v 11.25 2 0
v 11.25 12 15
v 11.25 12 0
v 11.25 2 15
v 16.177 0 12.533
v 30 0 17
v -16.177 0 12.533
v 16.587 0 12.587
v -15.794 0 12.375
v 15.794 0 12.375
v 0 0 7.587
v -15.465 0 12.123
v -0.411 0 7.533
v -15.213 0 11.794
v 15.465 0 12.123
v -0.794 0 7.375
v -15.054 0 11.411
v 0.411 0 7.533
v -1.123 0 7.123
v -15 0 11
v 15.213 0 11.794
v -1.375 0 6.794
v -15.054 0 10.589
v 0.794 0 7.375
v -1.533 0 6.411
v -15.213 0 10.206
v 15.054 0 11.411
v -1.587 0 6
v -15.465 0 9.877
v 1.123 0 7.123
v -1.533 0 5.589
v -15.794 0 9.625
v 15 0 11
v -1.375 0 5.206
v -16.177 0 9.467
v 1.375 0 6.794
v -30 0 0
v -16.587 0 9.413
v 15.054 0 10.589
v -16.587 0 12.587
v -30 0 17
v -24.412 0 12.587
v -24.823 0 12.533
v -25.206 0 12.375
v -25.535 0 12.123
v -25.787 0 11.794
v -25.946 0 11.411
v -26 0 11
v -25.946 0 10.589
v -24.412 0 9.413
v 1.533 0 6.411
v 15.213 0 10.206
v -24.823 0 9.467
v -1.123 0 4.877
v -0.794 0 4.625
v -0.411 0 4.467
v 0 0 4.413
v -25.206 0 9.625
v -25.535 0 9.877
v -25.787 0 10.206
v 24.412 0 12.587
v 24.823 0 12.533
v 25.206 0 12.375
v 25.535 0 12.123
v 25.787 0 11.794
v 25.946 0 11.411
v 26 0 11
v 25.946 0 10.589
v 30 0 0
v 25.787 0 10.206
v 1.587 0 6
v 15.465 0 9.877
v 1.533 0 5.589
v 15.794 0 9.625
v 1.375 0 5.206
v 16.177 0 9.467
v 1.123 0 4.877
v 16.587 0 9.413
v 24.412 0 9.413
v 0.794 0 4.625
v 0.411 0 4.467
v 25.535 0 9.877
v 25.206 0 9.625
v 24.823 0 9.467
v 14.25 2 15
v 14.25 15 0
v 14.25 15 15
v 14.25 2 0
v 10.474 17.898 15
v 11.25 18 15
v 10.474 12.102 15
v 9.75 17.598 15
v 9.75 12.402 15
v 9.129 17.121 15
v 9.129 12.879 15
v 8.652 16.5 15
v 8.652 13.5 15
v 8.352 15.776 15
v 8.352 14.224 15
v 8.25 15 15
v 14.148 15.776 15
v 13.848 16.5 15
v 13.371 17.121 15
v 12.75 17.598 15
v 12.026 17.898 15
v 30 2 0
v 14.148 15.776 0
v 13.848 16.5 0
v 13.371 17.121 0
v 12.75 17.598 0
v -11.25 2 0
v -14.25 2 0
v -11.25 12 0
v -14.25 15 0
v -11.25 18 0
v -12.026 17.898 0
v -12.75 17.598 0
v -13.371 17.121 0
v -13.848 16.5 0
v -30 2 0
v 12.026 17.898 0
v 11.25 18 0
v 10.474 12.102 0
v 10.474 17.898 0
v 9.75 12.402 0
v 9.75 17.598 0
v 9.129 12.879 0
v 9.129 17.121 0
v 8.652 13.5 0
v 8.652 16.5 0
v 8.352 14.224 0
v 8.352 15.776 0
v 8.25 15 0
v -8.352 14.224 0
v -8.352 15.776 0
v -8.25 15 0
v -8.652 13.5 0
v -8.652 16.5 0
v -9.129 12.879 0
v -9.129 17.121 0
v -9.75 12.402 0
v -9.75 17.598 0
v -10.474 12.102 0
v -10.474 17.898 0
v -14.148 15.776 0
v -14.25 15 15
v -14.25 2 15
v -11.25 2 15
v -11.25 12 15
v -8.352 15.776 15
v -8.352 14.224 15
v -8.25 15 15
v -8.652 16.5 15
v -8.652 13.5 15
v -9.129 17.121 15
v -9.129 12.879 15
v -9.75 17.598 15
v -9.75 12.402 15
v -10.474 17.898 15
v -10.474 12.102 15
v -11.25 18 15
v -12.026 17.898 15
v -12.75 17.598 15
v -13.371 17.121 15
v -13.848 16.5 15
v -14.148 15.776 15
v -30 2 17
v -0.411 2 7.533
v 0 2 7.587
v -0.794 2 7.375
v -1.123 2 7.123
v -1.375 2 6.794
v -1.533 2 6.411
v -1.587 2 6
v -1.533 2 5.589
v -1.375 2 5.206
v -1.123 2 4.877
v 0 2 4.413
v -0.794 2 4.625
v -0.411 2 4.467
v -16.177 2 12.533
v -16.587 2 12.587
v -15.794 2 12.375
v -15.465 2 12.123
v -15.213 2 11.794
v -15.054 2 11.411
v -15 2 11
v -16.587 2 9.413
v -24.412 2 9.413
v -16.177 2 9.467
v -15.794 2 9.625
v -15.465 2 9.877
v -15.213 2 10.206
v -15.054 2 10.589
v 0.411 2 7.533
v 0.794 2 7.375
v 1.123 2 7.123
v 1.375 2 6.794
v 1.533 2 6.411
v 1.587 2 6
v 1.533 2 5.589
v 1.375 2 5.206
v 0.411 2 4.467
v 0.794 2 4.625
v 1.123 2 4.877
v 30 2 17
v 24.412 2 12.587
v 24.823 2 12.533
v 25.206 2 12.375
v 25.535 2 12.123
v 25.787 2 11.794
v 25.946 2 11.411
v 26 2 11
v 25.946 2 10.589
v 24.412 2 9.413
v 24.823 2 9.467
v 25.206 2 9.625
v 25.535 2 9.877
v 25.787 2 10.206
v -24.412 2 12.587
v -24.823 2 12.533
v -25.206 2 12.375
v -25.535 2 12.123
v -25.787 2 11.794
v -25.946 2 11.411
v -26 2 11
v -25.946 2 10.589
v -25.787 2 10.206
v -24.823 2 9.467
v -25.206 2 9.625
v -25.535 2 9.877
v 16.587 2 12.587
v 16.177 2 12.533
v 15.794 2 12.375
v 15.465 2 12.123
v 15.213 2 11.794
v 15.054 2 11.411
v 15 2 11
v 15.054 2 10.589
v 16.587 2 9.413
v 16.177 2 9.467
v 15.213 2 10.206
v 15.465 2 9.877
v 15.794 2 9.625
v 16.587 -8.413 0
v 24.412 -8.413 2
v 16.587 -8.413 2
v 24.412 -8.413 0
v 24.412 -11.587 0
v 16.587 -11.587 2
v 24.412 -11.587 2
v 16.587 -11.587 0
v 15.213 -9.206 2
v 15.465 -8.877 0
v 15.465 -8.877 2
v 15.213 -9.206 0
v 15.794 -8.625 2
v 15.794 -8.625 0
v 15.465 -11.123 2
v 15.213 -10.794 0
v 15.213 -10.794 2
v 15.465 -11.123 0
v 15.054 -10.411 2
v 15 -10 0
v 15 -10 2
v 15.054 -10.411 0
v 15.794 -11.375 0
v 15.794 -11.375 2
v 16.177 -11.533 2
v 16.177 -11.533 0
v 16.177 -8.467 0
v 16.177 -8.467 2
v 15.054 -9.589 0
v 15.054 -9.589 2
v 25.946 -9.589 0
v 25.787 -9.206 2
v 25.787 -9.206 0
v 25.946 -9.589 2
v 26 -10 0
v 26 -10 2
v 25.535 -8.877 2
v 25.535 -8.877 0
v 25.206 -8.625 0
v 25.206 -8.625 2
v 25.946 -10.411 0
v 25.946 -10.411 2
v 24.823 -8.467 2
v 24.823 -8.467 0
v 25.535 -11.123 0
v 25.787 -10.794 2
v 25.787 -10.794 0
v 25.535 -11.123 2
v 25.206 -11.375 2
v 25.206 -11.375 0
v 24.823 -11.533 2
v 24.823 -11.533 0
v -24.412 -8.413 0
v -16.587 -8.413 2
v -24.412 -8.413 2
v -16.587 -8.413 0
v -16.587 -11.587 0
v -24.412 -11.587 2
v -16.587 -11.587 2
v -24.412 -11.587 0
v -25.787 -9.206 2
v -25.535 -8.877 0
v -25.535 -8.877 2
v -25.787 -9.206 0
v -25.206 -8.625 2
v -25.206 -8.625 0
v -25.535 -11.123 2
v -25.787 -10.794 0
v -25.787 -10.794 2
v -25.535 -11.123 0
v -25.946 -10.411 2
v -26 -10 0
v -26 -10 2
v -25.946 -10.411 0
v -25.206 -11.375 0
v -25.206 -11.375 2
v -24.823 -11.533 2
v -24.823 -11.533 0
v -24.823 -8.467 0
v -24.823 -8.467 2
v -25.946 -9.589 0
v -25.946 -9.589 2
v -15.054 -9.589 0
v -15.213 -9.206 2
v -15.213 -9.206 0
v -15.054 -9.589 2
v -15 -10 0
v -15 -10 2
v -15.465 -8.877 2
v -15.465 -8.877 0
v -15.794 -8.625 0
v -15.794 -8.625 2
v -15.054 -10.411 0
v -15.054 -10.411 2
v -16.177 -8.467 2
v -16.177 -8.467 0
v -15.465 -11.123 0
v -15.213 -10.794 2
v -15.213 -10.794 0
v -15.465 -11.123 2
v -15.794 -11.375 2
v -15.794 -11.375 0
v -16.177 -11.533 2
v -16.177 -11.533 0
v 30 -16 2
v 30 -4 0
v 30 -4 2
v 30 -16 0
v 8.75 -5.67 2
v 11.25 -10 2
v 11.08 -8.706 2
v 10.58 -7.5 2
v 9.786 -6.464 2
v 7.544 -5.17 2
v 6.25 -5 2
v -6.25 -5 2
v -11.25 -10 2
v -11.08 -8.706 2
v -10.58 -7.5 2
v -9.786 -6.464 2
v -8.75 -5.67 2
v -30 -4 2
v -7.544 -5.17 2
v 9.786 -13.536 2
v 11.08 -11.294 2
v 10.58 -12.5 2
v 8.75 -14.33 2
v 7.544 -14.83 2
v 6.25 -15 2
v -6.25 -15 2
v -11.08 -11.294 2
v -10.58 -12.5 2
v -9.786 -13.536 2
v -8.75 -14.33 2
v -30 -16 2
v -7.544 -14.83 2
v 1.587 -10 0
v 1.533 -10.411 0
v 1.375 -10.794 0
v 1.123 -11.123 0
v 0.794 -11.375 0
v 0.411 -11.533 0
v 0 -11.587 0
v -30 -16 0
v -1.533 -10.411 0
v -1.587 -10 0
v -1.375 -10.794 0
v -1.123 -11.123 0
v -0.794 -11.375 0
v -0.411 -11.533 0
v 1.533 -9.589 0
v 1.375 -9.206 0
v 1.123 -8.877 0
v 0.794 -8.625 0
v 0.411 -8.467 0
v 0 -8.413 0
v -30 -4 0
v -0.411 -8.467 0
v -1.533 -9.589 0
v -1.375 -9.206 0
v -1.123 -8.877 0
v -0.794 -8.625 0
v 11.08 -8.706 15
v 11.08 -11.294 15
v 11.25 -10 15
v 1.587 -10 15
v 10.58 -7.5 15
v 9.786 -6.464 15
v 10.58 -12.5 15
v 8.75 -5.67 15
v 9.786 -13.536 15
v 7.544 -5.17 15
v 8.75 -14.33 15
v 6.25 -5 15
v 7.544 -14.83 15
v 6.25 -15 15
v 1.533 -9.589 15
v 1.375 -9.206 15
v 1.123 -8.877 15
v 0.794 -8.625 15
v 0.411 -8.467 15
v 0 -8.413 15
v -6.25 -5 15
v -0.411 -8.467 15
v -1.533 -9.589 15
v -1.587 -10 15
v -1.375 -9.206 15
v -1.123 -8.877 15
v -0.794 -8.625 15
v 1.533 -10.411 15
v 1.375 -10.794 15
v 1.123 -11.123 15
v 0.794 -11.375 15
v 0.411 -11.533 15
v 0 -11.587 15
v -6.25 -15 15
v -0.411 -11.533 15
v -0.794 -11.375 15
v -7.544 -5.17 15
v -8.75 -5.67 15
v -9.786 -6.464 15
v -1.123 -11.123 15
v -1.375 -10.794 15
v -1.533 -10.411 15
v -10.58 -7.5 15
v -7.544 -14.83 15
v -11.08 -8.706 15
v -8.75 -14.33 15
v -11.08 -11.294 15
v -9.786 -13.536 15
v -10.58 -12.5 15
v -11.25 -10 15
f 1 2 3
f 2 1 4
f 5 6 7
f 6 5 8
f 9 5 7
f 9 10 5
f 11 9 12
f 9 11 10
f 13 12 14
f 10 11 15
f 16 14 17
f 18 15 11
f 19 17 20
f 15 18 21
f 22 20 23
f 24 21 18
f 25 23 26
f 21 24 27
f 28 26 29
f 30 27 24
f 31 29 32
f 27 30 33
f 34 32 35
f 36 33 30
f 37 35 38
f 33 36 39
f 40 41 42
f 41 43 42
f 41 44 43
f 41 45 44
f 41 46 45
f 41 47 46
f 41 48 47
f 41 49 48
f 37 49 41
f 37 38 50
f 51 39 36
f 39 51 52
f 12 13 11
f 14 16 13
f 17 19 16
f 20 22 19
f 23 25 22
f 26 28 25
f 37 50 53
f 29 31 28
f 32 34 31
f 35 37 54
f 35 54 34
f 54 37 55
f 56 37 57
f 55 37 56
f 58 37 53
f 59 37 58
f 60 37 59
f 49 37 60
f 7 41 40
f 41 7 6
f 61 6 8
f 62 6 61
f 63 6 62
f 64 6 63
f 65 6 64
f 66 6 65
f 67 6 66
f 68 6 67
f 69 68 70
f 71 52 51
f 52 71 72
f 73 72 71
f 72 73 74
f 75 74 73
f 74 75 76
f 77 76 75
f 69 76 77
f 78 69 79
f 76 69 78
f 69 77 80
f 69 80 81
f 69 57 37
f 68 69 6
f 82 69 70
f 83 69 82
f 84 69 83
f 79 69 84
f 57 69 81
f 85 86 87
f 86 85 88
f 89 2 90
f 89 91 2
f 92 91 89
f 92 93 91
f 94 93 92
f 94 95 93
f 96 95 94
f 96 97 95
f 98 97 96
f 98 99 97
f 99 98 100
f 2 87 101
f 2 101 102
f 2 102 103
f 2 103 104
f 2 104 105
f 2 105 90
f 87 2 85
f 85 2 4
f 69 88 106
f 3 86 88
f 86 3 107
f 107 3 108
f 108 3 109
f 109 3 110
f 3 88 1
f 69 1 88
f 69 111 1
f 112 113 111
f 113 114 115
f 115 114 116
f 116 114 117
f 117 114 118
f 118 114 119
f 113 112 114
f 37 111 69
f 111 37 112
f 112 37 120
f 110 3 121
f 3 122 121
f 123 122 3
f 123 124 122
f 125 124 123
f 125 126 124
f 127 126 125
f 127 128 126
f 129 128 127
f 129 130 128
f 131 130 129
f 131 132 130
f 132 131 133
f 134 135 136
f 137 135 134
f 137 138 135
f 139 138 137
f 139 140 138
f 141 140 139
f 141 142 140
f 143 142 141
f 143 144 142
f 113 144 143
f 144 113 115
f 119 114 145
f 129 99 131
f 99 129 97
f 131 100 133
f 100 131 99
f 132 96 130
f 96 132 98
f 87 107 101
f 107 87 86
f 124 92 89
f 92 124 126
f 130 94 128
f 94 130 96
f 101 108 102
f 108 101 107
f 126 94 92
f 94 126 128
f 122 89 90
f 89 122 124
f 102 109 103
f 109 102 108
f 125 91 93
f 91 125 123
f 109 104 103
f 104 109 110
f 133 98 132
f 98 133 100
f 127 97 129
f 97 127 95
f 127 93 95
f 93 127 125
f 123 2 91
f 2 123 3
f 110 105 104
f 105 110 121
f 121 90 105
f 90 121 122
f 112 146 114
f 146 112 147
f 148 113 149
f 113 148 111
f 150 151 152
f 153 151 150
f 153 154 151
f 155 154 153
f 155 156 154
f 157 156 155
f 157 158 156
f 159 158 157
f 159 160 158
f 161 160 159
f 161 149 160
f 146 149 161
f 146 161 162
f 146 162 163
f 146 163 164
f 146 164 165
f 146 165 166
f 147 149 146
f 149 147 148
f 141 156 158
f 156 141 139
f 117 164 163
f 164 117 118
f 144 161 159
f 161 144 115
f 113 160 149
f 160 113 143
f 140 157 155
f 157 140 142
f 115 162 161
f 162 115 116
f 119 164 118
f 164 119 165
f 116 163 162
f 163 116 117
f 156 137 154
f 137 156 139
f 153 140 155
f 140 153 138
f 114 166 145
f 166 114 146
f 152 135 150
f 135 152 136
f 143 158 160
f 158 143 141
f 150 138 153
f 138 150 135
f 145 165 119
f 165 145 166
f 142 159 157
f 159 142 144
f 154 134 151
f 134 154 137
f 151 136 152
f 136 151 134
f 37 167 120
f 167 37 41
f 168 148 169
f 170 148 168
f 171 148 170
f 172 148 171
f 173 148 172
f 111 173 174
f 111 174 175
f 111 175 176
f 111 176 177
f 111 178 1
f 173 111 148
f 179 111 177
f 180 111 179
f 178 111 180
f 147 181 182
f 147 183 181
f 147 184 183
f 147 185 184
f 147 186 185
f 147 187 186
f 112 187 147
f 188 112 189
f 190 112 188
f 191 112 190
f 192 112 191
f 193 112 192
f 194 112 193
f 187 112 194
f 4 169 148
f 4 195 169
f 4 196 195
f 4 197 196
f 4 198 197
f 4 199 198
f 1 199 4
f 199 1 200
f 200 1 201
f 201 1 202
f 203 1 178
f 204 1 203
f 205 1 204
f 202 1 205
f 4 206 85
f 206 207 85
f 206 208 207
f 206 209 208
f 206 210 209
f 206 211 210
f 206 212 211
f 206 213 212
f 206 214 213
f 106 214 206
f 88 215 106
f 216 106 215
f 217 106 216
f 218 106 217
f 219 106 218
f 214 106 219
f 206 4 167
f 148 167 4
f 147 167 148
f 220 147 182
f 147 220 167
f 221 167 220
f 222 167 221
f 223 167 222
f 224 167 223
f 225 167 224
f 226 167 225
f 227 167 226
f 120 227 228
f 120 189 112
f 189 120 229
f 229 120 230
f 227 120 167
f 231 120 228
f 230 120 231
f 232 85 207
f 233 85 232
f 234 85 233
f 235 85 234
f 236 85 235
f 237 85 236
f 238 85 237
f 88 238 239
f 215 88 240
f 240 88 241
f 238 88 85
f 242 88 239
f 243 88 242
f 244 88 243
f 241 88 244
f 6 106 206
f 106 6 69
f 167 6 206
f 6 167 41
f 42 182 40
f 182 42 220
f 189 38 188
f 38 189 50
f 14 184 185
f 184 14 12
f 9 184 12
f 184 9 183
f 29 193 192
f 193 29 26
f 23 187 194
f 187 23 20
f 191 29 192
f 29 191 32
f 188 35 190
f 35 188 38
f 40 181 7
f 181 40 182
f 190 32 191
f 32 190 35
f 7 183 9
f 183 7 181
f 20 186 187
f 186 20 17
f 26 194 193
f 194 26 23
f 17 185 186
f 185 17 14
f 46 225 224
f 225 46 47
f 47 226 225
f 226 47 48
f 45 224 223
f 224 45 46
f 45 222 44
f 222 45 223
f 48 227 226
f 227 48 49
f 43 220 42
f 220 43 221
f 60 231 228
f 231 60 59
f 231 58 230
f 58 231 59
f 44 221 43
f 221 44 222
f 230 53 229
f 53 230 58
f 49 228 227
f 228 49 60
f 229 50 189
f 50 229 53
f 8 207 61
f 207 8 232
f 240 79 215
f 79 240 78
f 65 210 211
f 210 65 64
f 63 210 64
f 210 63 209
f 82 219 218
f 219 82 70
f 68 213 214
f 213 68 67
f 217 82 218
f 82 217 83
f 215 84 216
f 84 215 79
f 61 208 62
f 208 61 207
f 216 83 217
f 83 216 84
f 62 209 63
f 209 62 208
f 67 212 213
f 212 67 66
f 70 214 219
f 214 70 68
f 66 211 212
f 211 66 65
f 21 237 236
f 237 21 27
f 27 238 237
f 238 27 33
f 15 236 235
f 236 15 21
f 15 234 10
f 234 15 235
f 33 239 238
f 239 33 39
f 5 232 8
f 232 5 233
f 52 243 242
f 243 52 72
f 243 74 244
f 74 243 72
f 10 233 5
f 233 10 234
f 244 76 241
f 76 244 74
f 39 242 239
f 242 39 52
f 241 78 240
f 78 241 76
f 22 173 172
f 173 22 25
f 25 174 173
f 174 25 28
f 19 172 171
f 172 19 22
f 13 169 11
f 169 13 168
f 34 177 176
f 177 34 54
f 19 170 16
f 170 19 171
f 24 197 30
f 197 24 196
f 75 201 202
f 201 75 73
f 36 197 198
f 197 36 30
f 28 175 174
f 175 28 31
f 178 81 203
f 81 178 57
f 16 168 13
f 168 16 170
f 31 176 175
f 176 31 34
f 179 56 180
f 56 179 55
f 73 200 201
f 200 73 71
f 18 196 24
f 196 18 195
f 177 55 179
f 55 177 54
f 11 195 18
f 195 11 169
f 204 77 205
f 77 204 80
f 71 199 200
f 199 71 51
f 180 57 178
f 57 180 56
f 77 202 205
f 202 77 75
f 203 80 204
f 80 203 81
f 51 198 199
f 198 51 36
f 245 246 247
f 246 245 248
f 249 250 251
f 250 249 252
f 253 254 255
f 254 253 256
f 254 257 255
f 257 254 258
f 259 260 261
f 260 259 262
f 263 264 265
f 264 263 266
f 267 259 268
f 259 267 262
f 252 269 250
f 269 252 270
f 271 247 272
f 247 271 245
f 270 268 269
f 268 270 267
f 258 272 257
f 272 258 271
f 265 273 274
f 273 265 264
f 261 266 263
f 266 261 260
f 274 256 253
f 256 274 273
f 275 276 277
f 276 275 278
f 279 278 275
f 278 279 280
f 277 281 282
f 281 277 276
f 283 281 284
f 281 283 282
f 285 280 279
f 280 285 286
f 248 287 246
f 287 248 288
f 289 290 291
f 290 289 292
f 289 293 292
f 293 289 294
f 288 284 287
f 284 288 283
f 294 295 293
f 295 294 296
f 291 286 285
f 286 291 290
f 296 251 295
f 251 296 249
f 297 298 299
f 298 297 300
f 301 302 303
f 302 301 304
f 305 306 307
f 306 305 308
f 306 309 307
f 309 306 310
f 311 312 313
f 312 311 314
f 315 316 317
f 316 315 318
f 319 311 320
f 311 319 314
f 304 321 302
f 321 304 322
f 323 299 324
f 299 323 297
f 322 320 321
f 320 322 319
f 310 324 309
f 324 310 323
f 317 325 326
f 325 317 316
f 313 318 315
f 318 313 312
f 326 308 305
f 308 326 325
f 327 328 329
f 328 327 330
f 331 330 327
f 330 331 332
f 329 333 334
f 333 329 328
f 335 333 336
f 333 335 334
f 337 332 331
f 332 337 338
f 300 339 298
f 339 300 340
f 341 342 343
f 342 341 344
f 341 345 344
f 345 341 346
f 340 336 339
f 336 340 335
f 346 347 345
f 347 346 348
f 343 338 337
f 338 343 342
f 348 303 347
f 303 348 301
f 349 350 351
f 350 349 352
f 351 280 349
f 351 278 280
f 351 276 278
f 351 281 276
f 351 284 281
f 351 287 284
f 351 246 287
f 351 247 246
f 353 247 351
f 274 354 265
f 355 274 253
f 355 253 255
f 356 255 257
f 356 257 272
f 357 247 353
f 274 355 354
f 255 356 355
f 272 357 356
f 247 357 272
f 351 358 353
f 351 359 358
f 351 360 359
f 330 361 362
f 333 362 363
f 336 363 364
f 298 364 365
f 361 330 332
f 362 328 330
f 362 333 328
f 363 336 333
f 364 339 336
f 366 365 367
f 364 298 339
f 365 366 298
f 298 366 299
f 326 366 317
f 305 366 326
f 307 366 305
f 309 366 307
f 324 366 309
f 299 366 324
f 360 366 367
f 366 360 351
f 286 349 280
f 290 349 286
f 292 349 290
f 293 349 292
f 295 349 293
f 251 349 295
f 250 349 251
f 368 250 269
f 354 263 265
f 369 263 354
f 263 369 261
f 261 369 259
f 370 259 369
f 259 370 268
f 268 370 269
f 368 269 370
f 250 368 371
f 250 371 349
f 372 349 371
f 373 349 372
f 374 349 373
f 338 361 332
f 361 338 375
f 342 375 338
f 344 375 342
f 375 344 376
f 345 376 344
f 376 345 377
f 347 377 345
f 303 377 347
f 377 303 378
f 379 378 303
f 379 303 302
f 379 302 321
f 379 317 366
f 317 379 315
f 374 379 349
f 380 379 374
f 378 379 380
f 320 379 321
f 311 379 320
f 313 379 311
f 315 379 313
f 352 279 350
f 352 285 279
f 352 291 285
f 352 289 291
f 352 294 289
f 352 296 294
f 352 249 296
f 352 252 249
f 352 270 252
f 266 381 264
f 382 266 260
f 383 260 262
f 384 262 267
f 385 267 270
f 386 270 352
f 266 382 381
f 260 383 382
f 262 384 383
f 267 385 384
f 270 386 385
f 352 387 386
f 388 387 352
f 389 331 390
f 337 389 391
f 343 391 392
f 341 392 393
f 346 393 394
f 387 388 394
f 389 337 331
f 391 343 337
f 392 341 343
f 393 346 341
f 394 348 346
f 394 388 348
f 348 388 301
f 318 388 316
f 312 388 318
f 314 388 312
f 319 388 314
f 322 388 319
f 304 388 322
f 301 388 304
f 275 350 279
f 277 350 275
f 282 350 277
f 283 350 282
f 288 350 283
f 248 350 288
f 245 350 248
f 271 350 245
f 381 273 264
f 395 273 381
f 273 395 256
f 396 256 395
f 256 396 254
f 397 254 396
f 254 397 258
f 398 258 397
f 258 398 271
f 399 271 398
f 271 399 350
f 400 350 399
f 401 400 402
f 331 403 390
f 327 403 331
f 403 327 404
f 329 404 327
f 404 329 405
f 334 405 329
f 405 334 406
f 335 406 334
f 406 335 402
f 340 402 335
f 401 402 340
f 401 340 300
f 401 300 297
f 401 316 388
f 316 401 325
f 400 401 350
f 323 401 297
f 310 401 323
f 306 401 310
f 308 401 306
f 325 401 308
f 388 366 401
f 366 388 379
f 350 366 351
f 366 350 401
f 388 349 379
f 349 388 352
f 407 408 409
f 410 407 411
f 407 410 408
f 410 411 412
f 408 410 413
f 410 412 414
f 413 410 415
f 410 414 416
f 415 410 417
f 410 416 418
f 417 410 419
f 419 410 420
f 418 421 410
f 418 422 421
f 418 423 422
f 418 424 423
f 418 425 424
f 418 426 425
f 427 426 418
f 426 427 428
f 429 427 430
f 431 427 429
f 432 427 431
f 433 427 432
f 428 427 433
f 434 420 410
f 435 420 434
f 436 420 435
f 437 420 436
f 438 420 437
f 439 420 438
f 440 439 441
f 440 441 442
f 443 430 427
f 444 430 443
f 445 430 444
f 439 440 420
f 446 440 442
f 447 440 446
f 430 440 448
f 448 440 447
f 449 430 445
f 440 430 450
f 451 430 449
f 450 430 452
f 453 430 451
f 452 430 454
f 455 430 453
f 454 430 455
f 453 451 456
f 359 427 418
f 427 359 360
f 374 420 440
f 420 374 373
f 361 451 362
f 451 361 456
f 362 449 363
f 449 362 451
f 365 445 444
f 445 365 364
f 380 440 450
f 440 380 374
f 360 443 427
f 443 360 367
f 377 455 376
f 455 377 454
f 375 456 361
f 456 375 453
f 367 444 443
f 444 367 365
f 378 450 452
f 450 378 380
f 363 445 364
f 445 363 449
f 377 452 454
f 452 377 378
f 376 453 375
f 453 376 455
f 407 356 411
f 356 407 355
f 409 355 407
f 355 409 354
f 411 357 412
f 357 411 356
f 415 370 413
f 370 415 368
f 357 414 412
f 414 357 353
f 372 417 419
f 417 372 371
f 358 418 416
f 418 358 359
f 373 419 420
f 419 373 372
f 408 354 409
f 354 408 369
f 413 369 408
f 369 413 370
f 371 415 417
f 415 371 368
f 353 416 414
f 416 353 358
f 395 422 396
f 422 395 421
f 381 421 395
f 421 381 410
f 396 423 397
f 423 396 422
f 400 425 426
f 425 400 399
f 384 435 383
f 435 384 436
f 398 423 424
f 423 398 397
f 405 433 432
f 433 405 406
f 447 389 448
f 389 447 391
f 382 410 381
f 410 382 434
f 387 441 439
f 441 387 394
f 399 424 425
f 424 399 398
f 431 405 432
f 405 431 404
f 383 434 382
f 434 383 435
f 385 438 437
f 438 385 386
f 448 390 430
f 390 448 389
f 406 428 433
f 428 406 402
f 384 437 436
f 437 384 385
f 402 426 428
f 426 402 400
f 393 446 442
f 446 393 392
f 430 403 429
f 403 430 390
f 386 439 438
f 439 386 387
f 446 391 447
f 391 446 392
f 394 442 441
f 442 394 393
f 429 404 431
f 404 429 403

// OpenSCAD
// Faceplate Clip - Socket and Peg

$fs=0.1;
$fa=15;

// render_part=1; // Faceplate_Clip_Peg()
render_part=2; // Faceplate_Clip_Socket()
render_part=3; // Faceplate_Clip_Peg and Faceplate_Clip_Socket

module Faceplate_Clip_Peg_Body(extension=0.1
	, base_width=12.0
	, base_length=60.0
	, base_height=2.0
	, peg_outer_length=22.5
	, peg_width=10.0
	, peg_height=13.0
  ) {
  union() {
    translate([-base_length/2,-base_width/2,0]) cube(size=[base_length,base_width,base_height],center=false);
    translate([-peg_outer_length/2+peg_width/2,-peg_width/2,0])
	cube(size=[peg_outer_length-peg_width,peg_width,peg_height+base_height],center=false);
    translate([-peg_outer_length/2+peg_width/2,0,0])
	cylinder(r=peg_width/2,h=peg_height+base_height,center=false);
    translate([peg_outer_length/2-peg_width/2,0,0])
	cylinder(r=peg_width/2,h=peg_height+base_height,center=false);
  }
}

module Faceplate_Clip_Peg_Holes(extension=0.1
	, base_height=2.0
	, peg_height=13.0
	, base_slot_separation=30.0
	, base_slot_width=25.4/8
	, base_slot_length=11.0
	) {
  union() {
    translate([base_slot_separation/2+base_slot_width/2,-base_slot_width/2,-extension])
      cube(size=[base_slot_length-base_slot_width,base_slot_width,2*extension+base_height],center=false);
    translate([base_slot_separation/2+base_slot_width/2,0,-extension])
      cylinder(r=base_slot_width/2,h=2*extension+base_height,center=false);
    translate([base_slot_separation/2+base_slot_length-base_slot_width/2,0,-extension])
      cylinder(r=base_slot_width/2,h=2*extension+base_height,center=false);
  }
  union() {
    translate([-base_slot_separation/2-base_slot_length+base_slot_width/2,-base_slot_width/2,-extension])
      cube(size=[base_slot_length-base_slot_width,base_slot_width,2*extension+base_height],center=false);
    translate([-base_slot_separation/2-base_slot_length+base_slot_width/2,0,-extension])
      cylinder(r=base_slot_width/2,h=2*extension+base_height,center=false);
    translate([-base_slot_separation/2-base_slot_width/2,0,-extension])
      cylinder(r=base_slot_width/2,h=2*extension+base_height,center=false);
  }
  translate([0,0,-extension]) cylinder(r=base_slot_width/2,h=2*extension+base_height+peg_height,center=false);
}

module Faceplate_Clip_Peg() {
  difference() {
    Faceplate_Clip_Peg_Body();
    Faceplate_Clip_Peg_Holes();
  }
}

if(render_part==1) {
  echo("Rendering Faceplate_Clip_Peg()...");
  Faceplate_Clip_Peg();
}

module Faceplate_Clip_Socket_Body(extension=0.1
	, base_width=12.0
	, base_length=60.0
	, base_height=2.0
	, peg_outer_length=22.5
	, peg_width=10.0
	, peg_height=13.0
	, clip_th=3.0
  ) {
  translate([-base_length/2,-base_width/2,0]) union() {
    cube(size=[base_length,base_width+peg_width/2,base_height],center=false);
    translate([base_length/2-peg_outer_length/2-clip_th,0,0]) {
	cube(size=[clip_th,1.5*peg_width,base_height+peg_width+clip_th],center=false);
	translate([clip_th,0,peg_width+clip_th+base_height]) rotate([-90,0,0]) cylinder(r=clip_th,h=1.5*peg_width,center=false);
    }
    translate([base_length/2+peg_outer_length/2,0,0]) {
	cube(size=[clip_th,1.5*peg_width,base_height+peg_width+clip_th],center=false);
	translate([0,0,peg_width+clip_th+base_height]) rotate([-90,0,0]) cylinder(r=clip_th,h=1.5*peg_width,center=false);
    }
  }
}

module Faceplate_Clip_Socket_Holes(extension=0.1
	, base_width=12.0
	, base_length=60.0
	, base_height=2.0
	, peg_width=10.0
	, peg_height=13.0
	, base_slot_separation=30.0
	, base_slot_width=25.4/8
	, base_slot_length=11.0
	, base_slot_y_offset=10.0/5
	) {
  translate([0,peg_width/2,0]) union() {
    translate([base_slot_separation/2+base_slot_width/2,-base_slot_width/2,-extension])
      cube(size=[base_slot_length-base_slot_width,base_slot_width,2*extension+base_height],center=false);
    translate([base_slot_separation/2+base_slot_width/2,0,-extension])
      cylinder(r=base_slot_width/2,h=2*extension+base_height,center=false);
    translate([base_slot_separation/2+base_slot_length-base_slot_width/2,0,-extension])
      cylinder(r=base_slot_width/2,h=2*extension+base_height,center=false);
  }
  translate([0,peg_width/2,0]) union() {
    translate([-base_slot_separation/2-base_slot_length+base_slot_width/2,-base_slot_width/2,-extension])
      cube(size=[base_slot_length-base_slot_width,base_slot_width,2*extension+base_height],center=false);
    translate([-base_slot_separation/2-base_slot_length+base_slot_width/2,0,-extension])
      cylinder(r=base_slot_width/2,h=2*extension+base_height,center=false);
    translate([-base_slot_separation/2-base_slot_width/2,0,-extension])
      cylinder(r=base_slot_width/2,h=2*extension+base_height,center=false);
  }
  translate([0,0,-extension]) cylinder(r=base_slot_width/2,h=2*extension+base_height+peg_height,center=false);
}

module Faceplate_Clip_Socket(extension=0.1
	, base_width=12.0
  ) {
  translate([0,base_width/2,0]) difference() {
    Faceplate_Clip_Socket_Body();
    Faceplate_Clip_Socket_Holes();
  }
}

if(render_part==2) {
  echo("Rendering Faceplate_Clip_Socket()...");
  Faceplate_Clip_Socket();
}

if(render_part==3) {
  echo("Rendering Faceplate_Clip_Peg() and Faceplate_Clip_Socket()...");
  rotate([90,0,180]) Faceplate_Clip_Socket();
  translate([0,-10.0,0]) Faceplate_Clip_Peg();
}
